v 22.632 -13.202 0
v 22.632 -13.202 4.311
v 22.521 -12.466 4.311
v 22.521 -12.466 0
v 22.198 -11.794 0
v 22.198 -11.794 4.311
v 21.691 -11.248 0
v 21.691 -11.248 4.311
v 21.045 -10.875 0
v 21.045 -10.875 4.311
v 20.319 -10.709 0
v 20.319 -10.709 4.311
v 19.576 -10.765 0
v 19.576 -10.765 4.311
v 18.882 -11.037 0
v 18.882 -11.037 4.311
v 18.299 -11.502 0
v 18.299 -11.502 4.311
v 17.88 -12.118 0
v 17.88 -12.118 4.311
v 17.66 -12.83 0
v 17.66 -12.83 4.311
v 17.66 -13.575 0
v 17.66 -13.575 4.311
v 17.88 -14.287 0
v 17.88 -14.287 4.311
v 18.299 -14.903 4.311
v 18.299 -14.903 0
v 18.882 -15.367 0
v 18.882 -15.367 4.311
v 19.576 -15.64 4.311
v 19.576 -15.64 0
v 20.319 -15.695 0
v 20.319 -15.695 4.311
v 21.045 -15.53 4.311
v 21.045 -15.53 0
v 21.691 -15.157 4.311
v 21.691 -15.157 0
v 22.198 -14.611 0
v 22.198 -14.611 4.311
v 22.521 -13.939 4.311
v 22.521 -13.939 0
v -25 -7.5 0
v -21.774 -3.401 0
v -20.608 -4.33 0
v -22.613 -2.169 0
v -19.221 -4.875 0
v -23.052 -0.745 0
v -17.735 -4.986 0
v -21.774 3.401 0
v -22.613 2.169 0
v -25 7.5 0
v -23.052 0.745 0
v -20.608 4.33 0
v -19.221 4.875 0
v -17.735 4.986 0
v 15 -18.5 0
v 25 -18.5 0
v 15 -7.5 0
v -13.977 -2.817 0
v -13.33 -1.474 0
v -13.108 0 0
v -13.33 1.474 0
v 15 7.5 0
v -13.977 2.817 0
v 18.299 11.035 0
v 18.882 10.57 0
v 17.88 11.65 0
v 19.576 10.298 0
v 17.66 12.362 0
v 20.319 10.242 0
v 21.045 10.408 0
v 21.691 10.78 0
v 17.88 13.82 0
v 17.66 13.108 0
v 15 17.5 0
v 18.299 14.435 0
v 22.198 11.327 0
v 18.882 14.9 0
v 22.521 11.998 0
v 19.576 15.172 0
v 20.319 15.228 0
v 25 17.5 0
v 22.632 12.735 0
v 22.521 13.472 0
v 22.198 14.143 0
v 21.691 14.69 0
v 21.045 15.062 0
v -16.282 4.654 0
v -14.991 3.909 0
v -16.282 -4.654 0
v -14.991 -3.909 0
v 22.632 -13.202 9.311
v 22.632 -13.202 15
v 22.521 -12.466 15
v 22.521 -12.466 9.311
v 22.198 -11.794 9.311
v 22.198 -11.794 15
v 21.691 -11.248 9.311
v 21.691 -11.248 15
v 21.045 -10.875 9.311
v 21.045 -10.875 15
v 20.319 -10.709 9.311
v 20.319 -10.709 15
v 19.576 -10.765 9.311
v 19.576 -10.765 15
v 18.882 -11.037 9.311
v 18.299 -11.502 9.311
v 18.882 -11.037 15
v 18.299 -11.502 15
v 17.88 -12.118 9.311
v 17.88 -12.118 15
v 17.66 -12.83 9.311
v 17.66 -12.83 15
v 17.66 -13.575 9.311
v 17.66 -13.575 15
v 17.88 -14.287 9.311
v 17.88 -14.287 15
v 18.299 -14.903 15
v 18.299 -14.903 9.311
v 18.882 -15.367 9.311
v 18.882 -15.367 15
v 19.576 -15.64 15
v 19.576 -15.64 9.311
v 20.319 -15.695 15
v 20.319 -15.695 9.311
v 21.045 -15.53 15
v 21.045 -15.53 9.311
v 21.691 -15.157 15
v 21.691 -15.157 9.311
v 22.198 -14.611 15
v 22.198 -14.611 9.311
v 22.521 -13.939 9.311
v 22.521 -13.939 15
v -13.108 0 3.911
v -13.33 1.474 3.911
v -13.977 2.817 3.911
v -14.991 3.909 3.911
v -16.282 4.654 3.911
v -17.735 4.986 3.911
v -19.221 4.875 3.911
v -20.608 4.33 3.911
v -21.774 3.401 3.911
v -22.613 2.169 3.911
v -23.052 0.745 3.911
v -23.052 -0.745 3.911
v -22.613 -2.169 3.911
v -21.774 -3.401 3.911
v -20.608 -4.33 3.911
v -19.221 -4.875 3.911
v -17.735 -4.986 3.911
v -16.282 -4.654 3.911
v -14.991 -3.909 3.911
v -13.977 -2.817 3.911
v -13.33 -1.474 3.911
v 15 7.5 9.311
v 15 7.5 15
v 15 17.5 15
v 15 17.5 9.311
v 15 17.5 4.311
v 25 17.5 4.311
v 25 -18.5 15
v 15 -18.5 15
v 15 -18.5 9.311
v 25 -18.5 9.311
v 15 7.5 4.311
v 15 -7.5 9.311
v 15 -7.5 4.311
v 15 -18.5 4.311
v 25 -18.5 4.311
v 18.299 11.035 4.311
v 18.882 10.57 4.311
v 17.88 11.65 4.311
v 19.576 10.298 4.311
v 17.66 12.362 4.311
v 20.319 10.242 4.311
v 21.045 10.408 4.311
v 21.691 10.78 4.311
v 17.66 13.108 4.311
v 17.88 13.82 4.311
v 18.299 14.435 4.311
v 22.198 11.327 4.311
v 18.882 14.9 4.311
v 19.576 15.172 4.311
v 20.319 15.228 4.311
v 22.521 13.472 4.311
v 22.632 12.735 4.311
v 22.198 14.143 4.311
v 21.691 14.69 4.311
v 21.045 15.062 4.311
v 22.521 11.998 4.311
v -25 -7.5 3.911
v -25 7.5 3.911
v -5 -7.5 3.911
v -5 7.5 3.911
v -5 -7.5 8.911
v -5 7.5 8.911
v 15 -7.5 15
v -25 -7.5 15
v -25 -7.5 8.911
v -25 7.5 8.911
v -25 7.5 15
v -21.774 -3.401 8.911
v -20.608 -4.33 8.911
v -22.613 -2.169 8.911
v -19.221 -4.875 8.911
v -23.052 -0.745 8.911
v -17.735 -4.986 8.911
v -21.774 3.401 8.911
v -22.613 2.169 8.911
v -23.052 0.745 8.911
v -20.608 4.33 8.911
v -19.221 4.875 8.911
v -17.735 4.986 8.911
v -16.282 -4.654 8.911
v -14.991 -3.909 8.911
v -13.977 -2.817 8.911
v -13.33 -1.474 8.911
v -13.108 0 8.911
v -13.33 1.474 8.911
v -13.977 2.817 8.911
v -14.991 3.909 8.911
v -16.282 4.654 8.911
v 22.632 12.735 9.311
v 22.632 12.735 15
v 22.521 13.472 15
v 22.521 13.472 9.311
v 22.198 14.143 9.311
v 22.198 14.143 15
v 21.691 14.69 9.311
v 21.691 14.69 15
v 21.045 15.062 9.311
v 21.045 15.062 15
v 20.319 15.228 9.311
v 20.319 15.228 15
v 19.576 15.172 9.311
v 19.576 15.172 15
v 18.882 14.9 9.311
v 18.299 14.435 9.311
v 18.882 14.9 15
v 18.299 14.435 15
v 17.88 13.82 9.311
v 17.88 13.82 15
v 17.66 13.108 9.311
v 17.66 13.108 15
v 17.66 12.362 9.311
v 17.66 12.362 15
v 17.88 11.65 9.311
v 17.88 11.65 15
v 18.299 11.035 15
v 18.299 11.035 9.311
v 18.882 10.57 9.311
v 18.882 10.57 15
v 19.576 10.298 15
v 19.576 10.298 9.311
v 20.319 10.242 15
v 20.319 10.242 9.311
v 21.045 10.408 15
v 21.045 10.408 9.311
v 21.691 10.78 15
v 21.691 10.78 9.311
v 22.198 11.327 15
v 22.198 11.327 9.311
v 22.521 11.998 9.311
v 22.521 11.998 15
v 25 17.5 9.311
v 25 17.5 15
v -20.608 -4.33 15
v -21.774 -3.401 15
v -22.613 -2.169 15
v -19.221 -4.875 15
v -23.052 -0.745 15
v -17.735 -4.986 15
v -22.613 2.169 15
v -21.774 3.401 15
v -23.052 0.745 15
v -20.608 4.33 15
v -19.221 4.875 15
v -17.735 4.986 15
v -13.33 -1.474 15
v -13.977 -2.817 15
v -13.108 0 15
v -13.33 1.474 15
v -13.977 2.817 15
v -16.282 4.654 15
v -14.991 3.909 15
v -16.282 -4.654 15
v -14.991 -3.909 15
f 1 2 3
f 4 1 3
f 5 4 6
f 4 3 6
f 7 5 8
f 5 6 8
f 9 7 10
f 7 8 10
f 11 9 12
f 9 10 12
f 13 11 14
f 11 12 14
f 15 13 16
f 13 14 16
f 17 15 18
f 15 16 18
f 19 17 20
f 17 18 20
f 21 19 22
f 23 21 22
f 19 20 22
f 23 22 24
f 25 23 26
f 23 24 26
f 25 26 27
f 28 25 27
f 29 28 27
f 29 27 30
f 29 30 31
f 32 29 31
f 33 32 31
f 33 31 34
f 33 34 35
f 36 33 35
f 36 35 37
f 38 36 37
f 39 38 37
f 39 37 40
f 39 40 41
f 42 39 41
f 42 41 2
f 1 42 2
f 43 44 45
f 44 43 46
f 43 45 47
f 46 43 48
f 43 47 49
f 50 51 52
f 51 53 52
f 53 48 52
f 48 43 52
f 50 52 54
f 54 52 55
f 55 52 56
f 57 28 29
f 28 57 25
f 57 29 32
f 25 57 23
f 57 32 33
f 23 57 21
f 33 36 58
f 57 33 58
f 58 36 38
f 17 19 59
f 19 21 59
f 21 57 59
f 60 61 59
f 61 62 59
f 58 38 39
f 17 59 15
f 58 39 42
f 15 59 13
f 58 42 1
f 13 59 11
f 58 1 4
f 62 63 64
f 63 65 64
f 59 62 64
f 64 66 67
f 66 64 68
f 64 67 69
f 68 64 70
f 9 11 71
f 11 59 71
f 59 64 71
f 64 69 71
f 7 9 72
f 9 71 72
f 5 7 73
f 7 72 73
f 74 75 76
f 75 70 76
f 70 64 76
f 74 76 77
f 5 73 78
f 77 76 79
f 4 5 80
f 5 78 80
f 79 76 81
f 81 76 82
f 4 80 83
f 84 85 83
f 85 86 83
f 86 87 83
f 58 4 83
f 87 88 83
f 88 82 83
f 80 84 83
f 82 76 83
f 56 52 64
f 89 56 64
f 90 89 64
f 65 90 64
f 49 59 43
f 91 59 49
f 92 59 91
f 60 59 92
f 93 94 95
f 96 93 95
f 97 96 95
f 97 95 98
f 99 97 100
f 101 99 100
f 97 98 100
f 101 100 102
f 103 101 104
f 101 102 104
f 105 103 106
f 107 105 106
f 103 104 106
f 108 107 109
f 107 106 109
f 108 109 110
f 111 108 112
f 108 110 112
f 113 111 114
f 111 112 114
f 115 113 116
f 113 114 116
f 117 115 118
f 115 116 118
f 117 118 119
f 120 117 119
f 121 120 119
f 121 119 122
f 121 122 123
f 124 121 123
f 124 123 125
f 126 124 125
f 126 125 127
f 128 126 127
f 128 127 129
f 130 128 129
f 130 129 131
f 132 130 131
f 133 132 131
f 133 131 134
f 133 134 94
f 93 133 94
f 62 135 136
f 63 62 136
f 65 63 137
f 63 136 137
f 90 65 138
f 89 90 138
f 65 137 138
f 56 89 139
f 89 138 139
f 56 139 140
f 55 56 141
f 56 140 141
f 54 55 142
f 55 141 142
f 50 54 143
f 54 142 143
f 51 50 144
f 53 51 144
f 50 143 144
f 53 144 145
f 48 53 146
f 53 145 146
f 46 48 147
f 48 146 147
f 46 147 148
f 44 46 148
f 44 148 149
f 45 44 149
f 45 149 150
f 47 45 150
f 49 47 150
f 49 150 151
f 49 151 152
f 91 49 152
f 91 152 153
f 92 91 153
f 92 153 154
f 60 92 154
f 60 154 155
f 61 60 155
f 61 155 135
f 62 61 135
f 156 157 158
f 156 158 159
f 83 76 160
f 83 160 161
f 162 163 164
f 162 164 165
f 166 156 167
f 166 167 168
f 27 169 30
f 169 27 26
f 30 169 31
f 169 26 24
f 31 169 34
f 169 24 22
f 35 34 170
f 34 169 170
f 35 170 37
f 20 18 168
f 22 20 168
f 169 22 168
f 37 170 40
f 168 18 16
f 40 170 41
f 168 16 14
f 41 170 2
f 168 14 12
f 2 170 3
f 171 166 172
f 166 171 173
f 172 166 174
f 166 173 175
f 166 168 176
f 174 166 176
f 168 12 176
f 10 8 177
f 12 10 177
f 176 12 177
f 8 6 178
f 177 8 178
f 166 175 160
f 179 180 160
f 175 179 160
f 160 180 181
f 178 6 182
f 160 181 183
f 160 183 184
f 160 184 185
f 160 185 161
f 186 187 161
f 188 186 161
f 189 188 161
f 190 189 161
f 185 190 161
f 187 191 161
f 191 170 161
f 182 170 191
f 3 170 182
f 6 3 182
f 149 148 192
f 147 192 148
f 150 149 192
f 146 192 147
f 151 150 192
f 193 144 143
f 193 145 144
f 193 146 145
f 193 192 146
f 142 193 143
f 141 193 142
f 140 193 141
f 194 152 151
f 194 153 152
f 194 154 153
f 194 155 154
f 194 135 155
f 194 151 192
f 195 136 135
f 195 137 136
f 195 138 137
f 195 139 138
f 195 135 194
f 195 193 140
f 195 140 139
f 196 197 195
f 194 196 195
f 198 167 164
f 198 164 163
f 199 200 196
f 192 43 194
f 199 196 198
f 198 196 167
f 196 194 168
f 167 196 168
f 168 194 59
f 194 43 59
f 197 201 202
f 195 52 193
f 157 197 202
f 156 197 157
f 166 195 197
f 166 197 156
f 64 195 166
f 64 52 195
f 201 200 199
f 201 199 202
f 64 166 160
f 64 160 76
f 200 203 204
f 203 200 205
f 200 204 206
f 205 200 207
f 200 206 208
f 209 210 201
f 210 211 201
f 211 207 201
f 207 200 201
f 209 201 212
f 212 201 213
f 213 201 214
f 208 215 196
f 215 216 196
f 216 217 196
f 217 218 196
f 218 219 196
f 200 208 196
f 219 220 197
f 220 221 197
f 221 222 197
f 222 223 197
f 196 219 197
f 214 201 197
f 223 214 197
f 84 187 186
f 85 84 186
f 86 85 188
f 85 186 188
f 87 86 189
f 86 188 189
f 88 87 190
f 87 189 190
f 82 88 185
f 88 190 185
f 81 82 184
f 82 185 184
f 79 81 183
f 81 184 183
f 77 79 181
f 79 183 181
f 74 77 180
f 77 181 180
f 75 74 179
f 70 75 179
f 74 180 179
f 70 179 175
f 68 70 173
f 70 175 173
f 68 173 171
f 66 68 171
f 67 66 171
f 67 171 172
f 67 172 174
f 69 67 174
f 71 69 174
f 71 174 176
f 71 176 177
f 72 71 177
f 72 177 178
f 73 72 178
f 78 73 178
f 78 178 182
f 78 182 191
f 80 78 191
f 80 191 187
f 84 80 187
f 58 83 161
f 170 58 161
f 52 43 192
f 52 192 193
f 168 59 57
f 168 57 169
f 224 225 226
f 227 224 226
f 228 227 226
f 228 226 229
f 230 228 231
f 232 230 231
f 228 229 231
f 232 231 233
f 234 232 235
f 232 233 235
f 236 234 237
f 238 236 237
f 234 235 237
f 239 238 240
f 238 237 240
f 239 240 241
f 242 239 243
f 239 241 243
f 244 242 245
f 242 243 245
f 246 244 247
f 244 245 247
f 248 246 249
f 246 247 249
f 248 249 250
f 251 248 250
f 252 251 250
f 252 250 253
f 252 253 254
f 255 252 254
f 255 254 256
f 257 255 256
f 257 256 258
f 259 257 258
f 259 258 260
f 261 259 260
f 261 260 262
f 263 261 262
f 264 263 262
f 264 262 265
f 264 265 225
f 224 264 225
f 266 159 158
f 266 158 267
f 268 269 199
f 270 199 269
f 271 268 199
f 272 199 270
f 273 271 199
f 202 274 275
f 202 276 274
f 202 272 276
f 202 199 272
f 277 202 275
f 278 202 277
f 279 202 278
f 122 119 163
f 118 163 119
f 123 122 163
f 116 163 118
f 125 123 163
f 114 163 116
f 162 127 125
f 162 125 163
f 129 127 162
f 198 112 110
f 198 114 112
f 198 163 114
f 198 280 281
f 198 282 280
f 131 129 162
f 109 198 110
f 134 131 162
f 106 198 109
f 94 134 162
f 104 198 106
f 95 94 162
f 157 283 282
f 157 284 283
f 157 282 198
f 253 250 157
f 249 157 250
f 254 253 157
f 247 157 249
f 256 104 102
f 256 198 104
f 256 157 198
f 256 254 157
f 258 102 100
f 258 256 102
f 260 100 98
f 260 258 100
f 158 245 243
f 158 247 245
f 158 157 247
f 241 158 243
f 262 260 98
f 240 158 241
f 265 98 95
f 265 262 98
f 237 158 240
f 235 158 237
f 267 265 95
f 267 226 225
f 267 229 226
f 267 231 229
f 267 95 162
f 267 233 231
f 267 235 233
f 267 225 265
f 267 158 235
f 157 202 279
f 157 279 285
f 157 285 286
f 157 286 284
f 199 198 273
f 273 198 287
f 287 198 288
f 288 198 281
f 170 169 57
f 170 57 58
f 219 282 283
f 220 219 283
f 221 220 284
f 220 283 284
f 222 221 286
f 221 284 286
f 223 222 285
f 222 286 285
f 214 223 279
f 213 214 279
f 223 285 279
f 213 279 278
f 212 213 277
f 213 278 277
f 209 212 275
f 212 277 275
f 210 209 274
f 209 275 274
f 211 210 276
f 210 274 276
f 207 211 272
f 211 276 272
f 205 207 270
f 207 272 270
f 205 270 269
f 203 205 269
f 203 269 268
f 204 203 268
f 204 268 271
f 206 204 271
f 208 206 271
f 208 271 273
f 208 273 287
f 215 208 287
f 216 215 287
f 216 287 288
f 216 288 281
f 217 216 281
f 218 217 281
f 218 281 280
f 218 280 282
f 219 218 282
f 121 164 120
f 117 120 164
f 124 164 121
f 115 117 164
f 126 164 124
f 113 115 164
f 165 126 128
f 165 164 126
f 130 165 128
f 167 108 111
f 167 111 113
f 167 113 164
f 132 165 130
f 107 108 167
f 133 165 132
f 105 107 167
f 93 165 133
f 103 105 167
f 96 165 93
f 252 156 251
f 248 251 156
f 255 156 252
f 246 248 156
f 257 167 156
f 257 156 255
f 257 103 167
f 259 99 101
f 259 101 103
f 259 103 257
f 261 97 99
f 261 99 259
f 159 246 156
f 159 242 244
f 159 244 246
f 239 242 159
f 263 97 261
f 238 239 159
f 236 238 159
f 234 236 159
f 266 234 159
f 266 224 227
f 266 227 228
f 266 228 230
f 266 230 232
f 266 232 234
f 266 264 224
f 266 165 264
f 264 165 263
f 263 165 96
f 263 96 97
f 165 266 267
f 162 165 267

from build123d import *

# Parameters (mm, degrees)
SKETCH1_W           = 50
SKETCH1_H           = 15
BOSS_EXTRUDE1_DEPTH = 15
SKETCH3_W           = 20
SKETCH3_H           = 5
CUT_EXTRUDE1_DEPTH  = 30
SKETCH5_R           = 5
CUT_EXTRUDE2_DEPTH  = 30
SKETCH7_W           = 10
SKETCH7_H           = 15
BOSS_EXTRUDE2_DEPTH = 10
SKETCH11_W          = 10
SKETCH11_H          = 15
BOSS_EXTRUDE5_DEPTH = 11
SKETCH12_R          = 2.5
CUT_EXTRUDE3_DEPTH  = 25
SKETCH13_W          = 5
SKETCH13_H          = 36
CUT_EXTRUDE4_DEPTH  = 10


with BuildPart() as part:
    # Sketch1 → Boss-Extrude1 (new body)
    with BuildSketch(Plane.XY):
        Rectangle(SKETCH1_W, SKETCH1_H)
    extrude(amount=BOSS_EXTRUDE1_DEPTH)

    # Sketch3 → Cut-Extrude1 (cut)
    with BuildSketch(Plane(origin=(0, 7.5, 0), x_dir=(1, 0, 0), z_dir=(0, 1, 0))):
        with Locations((-15, -6.411378574)):
            Rectangle(SKETCH3_W, SKETCH3_H)
    extrude(amount=-CUT_EXTRUDE1_DEPTH, mode=Mode.SUBTRACT)

    # Sketch5 → Cut-Extrude2 (cut)
    with BuildSketch(Plane.XY.offset(15)):
        with Locations((-18.108253402, 0)):
            Circle(SKETCH5_R)
    extrude(amount=-CUT_EXTRUDE2_DEPTH, mode=Mode.SUBTRACT)

    # Sketch7 → Boss-Extrude2 (add)
    with BuildSketch(Plane(origin=(0, 7.5, 0), x_dir=(1, 0, 0), z_dir=(0, 1, 0))):
        with Locations((20, -7.5)):
            Rectangle(SKETCH7_W, SKETCH7_H)
    extrude(amount=BOSS_EXTRUDE2_DEPTH)

    # Sketch11 → Boss-Extrude5 (add)
    with BuildSketch(Plane.XZ.offset(7.5)):
        with Locations((20, 7.5)):
            Rectangle(SKETCH11_W, SKETCH11_H)
    extrude(amount=BOSS_EXTRUDE5_DEPTH)

    # Sketch12 → Cut-Extrude3 (cut)
    with BuildSketch(Plane.XY.offset(15)):
        with Locations((20.132117018, 12.735002854)):
            Circle(SKETCH12_R)
        with Locations((20.132117018, -13.202407166)):
            Circle(SKETCH12_R)
    extrude(amount=-CUT_EXTRUDE3_DEPTH, mode=Mode.SUBTRACT)

    # Sketch13 → Cut-Extrude4 (cut)
    with BuildSketch(Plane(origin=(25, 0, 0), x_dir=(0, 0, -1), z_dir=(1, 0, 0))):
        with Locations((-6.81082534, -0.5)):
            Rectangle(SKETCH13_W, SKETCH13_H)
    extrude(amount=-CUT_EXTRUDE4_DEPTH, mode=Mode.SUBTRACT)


solid = part.part
